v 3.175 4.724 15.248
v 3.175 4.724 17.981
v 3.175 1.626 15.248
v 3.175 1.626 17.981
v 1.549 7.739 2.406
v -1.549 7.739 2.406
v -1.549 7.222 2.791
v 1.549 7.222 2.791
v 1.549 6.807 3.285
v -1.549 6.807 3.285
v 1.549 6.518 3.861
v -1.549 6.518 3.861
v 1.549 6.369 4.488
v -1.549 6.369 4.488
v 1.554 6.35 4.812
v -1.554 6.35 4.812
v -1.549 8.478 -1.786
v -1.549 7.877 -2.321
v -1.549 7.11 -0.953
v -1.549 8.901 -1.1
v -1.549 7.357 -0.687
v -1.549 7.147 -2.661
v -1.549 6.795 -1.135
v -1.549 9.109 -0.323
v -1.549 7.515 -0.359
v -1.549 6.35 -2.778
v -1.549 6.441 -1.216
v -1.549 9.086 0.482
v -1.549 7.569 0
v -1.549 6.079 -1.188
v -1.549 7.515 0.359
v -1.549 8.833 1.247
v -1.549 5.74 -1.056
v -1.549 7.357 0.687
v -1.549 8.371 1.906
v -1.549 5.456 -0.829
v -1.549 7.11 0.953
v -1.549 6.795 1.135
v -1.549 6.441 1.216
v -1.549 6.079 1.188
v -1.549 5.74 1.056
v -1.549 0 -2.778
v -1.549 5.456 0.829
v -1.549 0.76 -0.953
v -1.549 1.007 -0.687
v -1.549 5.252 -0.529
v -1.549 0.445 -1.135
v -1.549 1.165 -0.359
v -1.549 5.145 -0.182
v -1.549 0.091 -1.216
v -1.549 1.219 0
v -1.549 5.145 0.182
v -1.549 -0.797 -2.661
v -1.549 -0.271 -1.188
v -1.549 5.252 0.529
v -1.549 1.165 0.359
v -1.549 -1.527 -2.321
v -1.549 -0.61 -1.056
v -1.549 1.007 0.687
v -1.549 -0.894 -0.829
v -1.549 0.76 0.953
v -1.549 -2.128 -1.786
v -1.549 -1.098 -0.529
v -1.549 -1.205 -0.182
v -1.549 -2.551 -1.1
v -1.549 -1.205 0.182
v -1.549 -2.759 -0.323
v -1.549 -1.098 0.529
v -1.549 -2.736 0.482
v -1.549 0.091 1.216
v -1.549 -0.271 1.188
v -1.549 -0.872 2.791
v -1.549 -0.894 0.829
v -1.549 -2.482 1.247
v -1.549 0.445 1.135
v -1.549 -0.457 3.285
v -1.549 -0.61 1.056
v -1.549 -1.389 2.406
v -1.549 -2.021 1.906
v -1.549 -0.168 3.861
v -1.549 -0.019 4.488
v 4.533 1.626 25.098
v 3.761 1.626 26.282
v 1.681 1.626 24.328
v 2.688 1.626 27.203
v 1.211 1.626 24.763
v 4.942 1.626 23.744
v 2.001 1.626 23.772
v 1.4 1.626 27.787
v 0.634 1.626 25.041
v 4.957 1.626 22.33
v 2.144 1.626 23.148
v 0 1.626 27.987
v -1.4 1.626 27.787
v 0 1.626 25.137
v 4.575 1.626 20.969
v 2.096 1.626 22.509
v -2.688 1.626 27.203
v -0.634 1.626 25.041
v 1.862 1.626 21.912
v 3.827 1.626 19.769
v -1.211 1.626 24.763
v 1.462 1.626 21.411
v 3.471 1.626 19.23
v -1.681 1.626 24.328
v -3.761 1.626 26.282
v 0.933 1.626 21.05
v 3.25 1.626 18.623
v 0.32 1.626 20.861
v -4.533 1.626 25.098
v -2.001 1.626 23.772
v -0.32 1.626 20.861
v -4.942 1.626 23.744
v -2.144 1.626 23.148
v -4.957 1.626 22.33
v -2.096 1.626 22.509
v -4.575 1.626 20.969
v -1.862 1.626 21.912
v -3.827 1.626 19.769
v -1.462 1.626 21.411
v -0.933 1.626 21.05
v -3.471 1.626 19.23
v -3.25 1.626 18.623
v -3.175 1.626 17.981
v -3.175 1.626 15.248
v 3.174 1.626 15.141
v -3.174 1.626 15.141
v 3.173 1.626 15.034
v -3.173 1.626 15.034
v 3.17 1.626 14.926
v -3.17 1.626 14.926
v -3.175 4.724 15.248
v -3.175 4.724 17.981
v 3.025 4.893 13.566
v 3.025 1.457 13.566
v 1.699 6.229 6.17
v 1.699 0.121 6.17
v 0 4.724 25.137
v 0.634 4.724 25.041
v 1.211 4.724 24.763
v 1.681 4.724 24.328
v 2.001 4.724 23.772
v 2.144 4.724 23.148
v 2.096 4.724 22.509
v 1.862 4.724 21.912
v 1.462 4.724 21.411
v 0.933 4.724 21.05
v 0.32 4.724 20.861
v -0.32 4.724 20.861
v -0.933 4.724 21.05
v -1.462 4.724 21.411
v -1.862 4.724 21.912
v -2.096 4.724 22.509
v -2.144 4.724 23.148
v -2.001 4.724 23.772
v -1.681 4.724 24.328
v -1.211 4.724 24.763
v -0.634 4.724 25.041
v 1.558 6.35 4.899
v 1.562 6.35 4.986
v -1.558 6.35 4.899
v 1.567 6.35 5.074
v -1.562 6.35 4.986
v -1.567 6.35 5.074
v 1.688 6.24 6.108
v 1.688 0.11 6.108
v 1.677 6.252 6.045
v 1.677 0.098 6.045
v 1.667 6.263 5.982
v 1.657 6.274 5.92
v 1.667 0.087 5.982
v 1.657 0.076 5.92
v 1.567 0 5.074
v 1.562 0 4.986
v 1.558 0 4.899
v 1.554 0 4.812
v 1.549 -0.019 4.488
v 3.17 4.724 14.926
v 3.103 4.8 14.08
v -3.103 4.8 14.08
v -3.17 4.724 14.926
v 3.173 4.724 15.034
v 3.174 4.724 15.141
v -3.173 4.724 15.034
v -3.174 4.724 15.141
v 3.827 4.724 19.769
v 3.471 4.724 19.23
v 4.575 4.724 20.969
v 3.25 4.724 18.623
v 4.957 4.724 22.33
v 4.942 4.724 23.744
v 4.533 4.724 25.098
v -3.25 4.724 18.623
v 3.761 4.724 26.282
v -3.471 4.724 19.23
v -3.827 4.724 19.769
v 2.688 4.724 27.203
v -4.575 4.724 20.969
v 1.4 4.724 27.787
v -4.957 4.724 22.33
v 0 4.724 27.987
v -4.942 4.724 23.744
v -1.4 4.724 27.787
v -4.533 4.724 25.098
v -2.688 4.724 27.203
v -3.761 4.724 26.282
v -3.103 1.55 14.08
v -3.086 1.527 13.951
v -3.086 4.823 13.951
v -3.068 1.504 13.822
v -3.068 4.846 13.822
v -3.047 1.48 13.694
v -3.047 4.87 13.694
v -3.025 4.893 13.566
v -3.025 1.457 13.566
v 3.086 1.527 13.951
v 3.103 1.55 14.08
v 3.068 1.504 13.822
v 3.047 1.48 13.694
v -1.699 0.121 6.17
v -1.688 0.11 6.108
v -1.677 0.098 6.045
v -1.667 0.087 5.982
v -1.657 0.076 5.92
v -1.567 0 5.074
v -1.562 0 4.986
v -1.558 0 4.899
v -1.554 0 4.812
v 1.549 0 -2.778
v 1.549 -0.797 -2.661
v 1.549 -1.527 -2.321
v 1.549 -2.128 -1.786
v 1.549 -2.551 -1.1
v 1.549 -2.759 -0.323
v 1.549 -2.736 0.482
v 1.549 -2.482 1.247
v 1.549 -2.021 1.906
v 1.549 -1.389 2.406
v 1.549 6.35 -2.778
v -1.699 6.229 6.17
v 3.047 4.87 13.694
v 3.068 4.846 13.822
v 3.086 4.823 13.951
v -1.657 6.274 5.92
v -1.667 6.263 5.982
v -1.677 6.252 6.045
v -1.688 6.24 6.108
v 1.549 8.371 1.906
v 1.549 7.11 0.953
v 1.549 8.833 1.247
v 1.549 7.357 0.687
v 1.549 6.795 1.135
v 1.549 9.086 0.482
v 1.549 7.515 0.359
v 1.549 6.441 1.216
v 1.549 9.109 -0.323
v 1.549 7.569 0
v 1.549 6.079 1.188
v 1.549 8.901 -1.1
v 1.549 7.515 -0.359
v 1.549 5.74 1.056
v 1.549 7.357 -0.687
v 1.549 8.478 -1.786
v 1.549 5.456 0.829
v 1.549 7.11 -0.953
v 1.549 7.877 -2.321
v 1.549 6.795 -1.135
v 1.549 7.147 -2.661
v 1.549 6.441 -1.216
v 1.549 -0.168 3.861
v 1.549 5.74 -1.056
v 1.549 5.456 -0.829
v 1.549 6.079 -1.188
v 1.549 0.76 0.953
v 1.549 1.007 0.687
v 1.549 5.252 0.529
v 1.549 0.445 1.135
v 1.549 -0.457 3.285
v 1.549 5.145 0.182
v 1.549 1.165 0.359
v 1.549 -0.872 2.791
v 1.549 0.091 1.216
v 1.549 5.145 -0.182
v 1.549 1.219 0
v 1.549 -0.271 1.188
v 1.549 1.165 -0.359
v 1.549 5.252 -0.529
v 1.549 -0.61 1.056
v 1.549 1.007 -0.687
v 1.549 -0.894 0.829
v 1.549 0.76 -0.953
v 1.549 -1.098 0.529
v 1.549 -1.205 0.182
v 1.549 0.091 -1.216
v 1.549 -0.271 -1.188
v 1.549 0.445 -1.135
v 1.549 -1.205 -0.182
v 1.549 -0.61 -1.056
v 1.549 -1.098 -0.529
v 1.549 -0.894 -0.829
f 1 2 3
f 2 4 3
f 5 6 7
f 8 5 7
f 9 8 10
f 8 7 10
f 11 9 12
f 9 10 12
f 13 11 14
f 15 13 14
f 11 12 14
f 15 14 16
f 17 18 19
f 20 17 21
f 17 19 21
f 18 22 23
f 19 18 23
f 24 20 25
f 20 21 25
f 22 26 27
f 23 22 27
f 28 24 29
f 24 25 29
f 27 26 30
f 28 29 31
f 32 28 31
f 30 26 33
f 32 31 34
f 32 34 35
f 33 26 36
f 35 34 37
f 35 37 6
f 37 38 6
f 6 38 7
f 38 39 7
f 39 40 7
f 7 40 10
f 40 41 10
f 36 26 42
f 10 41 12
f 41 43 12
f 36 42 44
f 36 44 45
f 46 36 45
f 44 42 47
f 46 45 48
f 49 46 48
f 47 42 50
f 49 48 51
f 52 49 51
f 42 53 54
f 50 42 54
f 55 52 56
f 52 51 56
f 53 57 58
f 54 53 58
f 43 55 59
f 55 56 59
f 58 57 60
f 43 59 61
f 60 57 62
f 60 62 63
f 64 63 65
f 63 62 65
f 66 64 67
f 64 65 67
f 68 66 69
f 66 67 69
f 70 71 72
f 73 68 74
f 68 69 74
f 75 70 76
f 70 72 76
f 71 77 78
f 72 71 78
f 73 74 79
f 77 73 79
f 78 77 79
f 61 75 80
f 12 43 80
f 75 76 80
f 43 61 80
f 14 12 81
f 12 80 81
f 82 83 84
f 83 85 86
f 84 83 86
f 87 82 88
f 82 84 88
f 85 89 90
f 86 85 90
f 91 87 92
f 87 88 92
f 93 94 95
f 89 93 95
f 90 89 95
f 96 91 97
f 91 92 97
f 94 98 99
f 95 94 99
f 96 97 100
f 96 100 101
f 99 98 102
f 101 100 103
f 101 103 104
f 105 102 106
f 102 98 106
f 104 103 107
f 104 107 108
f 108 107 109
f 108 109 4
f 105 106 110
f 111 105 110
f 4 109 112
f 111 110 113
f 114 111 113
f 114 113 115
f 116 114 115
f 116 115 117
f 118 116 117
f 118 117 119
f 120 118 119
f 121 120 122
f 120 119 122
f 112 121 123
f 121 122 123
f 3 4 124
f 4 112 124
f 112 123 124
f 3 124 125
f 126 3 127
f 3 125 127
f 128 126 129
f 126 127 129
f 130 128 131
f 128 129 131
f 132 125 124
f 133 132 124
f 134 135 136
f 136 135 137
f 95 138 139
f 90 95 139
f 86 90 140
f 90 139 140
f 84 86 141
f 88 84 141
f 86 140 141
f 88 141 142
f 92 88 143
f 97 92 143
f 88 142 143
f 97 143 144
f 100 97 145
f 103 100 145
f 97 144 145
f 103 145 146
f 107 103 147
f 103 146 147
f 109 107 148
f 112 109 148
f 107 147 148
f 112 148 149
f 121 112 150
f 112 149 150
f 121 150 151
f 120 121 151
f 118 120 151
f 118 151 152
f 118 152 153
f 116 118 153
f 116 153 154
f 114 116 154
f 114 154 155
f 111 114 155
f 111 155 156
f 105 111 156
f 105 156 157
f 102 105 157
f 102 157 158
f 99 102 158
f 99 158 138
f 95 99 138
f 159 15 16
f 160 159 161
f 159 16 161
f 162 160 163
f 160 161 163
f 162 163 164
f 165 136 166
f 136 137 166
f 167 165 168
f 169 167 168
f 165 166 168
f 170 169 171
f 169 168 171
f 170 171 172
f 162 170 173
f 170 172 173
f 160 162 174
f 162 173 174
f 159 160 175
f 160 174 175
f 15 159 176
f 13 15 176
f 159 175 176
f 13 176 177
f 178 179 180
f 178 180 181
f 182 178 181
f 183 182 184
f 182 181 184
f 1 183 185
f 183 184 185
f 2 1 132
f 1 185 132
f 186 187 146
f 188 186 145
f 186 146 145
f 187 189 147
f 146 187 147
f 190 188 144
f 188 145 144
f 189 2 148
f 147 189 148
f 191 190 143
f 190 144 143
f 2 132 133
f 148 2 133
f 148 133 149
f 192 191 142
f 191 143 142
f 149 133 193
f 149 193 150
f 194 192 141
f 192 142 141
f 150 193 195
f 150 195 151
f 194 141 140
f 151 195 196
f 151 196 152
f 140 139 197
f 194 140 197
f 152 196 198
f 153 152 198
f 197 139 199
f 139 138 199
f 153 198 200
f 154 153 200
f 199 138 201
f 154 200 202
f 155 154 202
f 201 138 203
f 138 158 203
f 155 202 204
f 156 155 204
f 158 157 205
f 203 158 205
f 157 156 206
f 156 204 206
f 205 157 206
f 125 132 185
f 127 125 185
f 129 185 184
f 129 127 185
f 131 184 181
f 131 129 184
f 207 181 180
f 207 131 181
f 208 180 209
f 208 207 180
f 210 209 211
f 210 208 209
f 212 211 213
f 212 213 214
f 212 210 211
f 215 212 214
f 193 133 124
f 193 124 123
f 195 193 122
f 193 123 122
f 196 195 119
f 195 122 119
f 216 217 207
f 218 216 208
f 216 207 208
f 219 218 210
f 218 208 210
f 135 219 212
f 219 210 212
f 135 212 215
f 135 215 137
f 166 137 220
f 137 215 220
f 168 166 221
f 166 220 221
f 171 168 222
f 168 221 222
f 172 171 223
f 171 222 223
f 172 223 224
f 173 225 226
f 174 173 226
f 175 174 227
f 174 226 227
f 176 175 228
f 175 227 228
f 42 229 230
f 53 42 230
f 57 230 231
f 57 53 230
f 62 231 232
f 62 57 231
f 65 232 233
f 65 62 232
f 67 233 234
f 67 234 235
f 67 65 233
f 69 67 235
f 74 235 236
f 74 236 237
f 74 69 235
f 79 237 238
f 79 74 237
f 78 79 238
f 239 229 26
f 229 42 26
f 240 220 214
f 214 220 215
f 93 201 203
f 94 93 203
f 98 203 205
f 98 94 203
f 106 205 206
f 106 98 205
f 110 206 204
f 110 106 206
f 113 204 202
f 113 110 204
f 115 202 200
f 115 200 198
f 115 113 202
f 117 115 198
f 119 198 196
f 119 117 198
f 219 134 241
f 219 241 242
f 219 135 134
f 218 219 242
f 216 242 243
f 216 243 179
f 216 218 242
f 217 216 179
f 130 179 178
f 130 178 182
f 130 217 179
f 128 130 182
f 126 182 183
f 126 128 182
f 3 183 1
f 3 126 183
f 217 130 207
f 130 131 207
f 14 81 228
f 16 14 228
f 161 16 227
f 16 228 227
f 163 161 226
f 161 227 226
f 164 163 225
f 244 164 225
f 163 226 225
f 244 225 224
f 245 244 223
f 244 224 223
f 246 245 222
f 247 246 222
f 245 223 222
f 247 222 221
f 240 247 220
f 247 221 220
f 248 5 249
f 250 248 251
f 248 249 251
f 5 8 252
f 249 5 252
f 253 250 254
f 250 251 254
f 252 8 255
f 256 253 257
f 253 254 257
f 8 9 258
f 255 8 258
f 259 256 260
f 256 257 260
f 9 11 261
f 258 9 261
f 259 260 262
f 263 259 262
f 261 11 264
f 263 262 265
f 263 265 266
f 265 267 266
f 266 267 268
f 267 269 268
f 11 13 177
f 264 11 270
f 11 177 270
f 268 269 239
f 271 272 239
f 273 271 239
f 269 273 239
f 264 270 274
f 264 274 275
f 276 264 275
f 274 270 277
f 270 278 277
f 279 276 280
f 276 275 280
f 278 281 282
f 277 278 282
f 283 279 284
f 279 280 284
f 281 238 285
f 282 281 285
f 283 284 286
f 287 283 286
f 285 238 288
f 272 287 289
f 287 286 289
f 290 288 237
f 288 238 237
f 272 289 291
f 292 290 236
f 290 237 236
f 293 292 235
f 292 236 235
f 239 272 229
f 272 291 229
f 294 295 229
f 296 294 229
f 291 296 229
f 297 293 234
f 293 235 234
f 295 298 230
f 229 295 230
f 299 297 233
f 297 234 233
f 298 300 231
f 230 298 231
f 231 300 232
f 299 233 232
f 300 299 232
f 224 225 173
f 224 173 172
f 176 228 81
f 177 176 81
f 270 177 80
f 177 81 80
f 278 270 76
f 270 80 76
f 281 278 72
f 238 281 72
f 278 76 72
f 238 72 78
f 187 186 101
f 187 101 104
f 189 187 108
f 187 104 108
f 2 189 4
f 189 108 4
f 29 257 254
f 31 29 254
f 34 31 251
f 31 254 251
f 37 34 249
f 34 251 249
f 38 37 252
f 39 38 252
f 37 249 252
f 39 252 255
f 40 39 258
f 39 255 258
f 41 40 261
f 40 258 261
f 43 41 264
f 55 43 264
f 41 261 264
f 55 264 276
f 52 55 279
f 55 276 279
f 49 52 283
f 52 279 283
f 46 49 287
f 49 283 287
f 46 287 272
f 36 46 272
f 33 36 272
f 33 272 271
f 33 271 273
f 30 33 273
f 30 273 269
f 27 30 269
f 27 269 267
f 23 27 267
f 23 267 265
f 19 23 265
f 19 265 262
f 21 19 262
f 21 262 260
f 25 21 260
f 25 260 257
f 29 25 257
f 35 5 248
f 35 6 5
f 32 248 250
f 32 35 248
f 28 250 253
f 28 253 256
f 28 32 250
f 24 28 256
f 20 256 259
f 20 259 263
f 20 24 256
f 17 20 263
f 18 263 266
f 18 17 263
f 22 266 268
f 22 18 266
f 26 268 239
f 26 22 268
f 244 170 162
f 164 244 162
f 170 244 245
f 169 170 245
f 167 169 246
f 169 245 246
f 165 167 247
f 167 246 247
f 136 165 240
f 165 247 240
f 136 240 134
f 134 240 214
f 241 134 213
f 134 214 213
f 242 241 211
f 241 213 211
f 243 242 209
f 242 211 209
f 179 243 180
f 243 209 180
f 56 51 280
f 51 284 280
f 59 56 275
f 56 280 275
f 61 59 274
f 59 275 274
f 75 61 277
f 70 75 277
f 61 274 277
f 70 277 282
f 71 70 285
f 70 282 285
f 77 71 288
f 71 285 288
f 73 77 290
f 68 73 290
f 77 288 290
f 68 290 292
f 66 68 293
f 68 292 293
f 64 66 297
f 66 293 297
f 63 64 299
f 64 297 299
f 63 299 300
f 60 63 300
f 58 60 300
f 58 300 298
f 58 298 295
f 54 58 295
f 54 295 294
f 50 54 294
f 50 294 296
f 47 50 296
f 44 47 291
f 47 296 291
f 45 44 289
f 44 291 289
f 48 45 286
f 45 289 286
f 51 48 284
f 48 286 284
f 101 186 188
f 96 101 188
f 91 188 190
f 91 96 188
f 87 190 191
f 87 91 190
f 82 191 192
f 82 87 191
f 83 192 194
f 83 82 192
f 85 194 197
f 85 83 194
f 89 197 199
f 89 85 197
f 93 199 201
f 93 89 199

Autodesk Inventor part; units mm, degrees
sketch "Skizze_1" plane through (0, 0, 0) normal (1, 0, 0) x (0, 1, 0)
  line L0 (4.724, 30) -> (1.626, 30)
  line L1 (1.626, 30) -> (1.626, 14.9265)
  arc A0 (1.5502, 14.0803) -> (1.626, 14.9265) centre (-3.134, 14.9265) ccw
  line L2 (1.5502, 14.0803) -> (0.0758, 5.9197)
  arc A1 (0.0758, 5.9197) -> (0, 5.0735) centre (4.76, 5.0735) ccw
  line L3 (0, 5.0735) -> (0, 4.8116)
  arc A2 (-1.389, 2.4058) -> (0, 4.8116) centre (-2.778, 4.8116) ccw
  arc A3 (-1.389, 2.4058) -> (0, -2.778) centre (0, 0) ccw
  line L4 (0, -2.778) -> (6.35, -2.778)
  arc A4 (6.35, -2.778) -> (7.739, 2.4058) centre (6.35, 0) ccw
  arc A5 (6.35, 4.8116) -> (7.739, 2.4058) centre (9.128, 4.8116) ccw
  line L5 (6.35, 4.8116) -> (6.35, 5.0735)
  arc A6 (6.35, 5.0735) -> (6.2742, 5.9197) centre (1.59, 5.0735) ccw
  line L6 (6.2742, 5.9197) -> (4.7998, 14.0803)
  arc A7 (4.724, 14.9265) -> (4.7998, 14.0803) centre (9.484, 14.9265) ccw
  line L7 (4.724, 14.9265) -> (4.724, 30)
extrude "Extrusion1" add sketch "Skizze_1" along normal mid plane 10
sketch "Skizze_2" plane through (0, 0, 0) normal (0, 1, 0) x (-1, 0, 0)
  line L0 (39, 78) -> (-69, 78)
  line L1 (-69, 78) -> (-69, -55)
  line L2 (-69, -55) -> (39, -55)
  line L3 (39, -55) -> (39, 78)
  arc A0 (3.8268, 19.769) -> (0, 27.987) centre (0, 22.987) ccw
  arc A1 (0, 27.987) -> (-3.8268, 19.769) centre (0, 22.987) ccw
  arc A2 (-3.175, 17.9811) -> (-3.8268, 19.769) centre (-5.953, 17.9811) ccw
  line L4 (-3.175, 17.9811) -> (-3.175, 15.2476)
  arc A3 (-3.175, 15.2476) -> (-3.0253, 13.5657) centre (6.35, 15.2476) ccw
  line L5 (-3.0253, 13.5657) -> (-1.6987, 6.1703)
  arc A4 (-1.549, 4.4884) -> (-1.6987, 6.1703) centre (-11.074, 4.4884) ccw
  line L6 (-1.549, 4.4884) -> (-1.549, -2.788)
  line L7 (-1.549, -2.788) -> (1.549, -2.788)
  line L8 (1.549, -2.788) -> (1.549, 4.4884)
  arc A5 (1.6987, 6.1703) -> (1.549, 4.4884) centre (11.074, 4.4884) ccw
  line L9 (1.6987, 6.1703) -> (3.0253, 13.5657)
  arc A6 (3.0253, 13.5657) -> (3.175, 15.2476) centre (-6.35, 15.2476) ccw
  line L10 (3.175, 15.2476) -> (3.175, 17.9811)
  arc A7 (3.8268, 19.769) -> (3.175, 17.9811) centre (5.953, 17.9811) ccw
extrude "Extrusion2" cut sketch "Skizze_2" along normal mid plane 40
sketch "Skizze_3" plane through (0, 0, 0) normal (1, 0, 0) x (0, 1, 0)
  line L0 (10, 22.987) -> (-10, 22.987)
  line L1 (-10, 22.987) -> (-10, 25.137)
  line L2 (-10, 25.137) -> (10, 25.137)
  line L3 (10, 25.137) -> (10, 22.987)
  line L4 (10, 22.987) -> (-10, 22.987)
revolve "Revolution1" cut sketch "Skizze_3" angle 360 about axis through (0, 10, 22.987) along (0, 1, 0)
sketch "Skizze_4" plane through (0, 0, 0) normal (0, 0, 1) x (1, 0, 0)
  line L0 (10, 0) -> (-10, 0)
  line L1 (-10, 0) -> (-10, 1.219)
  line L2 (-10, 1.219) -> (10, 1.219)
  line L3 (10, 1.219) -> (10, 0)
  line L4 (10, 0) -> (-10, 0)
revolve "Revolution2" cut sketch "Skizze_4" angle 360 about axis through (10, 0, 0) along (1, 0, 0)
sketch "Skizze_5" plane through (0, 0, 0) normal (0, 0, 1) x (1, 0, 0)
  line L0 (10, 6.35) -> (-10, 6.35)
  line L1 (-10, 6.35) -> (-10, 7.569)
  line L2 (-10, 7.569) -> (10, 7.569)
  line L3 (10, 7.569) -> (10, 6.35)
  line L4 (10, 6.35) -> (-10, 6.35)
revolve "Revolution3" cut sketch "Skizze_5" angle 360 about axis through (10, 6.35, 0) along (1, 0, 0)
ref_plane "SA1_XY" through (0, 0, 0) normal (1, 0, 0) x (0, 0, -1)
ref_plane "SA1_YZ" through (0, 0, 0) normal (0, 0, -1) x (0, 1, 0)
ref_plane "SA1_ZX" through (0, 0, 0) normal (0, 1, 0) x (1, 0, 0)
ref_plane "SA2_XY" through (0, 6.35, 0) normal (1, 0, 0) x (0, 0, -1)
ref_plane "SA2_YZ" through (0, 6.35, 0) normal (0, 0, -1) x (0, 1, 0)
ref_plane "SA2_ZX" through (0, 6.35, 0) normal (0, 1, 0) x (1, 0, 0)
ref_plane "SA3_XY" through (0, 3.175, 22.987) normal (0, 1, 0) x (1, 0, 0)
ref_plane "SA3_YZ" through (0, 3.175, 22.987) normal (1, 0, 0) x (0, 0, -1)
ref_plane "SA3_ZX" through (0, 3.175, 22.987) normal (0, 0, -1) x (0, 1, 0)
ref_plane "b_left_XY" through (0, 1.626, 27.987) normal (1, 0, 0) x (0, 0, -1)
ref_plane "b_left_YZ" through (0, 1.626, 27.987) normal (0, 0, -1) x (0, 1, 0)
ref_plane "b_left_ZX" through (0, 1.626, 27.987) normal (0, 1, 0) x (1, 0, 0)
ref_plane "r_top_XY" through (0, 9.128, 0) normal (1, 0, 0) x (0, 0, -1)
ref_plane "r_top_YZ" through (0, 9.128, 0) normal (0, 0, -1) x (0, 1, 0)
ref_plane "r_top_ZX" through (0, 9.128, 0) normal (0, 1, 0) x (1, 0, 0)
ref_plane "z_left_XY" through (0, 4.724, 27.987) normal (1, 0, 0) x (0, 0, -1)
ref_plane "z_left_YZ" through (0, 4.724, 27.987) normal (0, 0, -1) x (0, 1, 0)
ref_plane "z_left_ZX" through (0, 4.724, 27.987) normal (0, 1, 0) x (1, 0, 0)
properties part number "205-S-SA"
